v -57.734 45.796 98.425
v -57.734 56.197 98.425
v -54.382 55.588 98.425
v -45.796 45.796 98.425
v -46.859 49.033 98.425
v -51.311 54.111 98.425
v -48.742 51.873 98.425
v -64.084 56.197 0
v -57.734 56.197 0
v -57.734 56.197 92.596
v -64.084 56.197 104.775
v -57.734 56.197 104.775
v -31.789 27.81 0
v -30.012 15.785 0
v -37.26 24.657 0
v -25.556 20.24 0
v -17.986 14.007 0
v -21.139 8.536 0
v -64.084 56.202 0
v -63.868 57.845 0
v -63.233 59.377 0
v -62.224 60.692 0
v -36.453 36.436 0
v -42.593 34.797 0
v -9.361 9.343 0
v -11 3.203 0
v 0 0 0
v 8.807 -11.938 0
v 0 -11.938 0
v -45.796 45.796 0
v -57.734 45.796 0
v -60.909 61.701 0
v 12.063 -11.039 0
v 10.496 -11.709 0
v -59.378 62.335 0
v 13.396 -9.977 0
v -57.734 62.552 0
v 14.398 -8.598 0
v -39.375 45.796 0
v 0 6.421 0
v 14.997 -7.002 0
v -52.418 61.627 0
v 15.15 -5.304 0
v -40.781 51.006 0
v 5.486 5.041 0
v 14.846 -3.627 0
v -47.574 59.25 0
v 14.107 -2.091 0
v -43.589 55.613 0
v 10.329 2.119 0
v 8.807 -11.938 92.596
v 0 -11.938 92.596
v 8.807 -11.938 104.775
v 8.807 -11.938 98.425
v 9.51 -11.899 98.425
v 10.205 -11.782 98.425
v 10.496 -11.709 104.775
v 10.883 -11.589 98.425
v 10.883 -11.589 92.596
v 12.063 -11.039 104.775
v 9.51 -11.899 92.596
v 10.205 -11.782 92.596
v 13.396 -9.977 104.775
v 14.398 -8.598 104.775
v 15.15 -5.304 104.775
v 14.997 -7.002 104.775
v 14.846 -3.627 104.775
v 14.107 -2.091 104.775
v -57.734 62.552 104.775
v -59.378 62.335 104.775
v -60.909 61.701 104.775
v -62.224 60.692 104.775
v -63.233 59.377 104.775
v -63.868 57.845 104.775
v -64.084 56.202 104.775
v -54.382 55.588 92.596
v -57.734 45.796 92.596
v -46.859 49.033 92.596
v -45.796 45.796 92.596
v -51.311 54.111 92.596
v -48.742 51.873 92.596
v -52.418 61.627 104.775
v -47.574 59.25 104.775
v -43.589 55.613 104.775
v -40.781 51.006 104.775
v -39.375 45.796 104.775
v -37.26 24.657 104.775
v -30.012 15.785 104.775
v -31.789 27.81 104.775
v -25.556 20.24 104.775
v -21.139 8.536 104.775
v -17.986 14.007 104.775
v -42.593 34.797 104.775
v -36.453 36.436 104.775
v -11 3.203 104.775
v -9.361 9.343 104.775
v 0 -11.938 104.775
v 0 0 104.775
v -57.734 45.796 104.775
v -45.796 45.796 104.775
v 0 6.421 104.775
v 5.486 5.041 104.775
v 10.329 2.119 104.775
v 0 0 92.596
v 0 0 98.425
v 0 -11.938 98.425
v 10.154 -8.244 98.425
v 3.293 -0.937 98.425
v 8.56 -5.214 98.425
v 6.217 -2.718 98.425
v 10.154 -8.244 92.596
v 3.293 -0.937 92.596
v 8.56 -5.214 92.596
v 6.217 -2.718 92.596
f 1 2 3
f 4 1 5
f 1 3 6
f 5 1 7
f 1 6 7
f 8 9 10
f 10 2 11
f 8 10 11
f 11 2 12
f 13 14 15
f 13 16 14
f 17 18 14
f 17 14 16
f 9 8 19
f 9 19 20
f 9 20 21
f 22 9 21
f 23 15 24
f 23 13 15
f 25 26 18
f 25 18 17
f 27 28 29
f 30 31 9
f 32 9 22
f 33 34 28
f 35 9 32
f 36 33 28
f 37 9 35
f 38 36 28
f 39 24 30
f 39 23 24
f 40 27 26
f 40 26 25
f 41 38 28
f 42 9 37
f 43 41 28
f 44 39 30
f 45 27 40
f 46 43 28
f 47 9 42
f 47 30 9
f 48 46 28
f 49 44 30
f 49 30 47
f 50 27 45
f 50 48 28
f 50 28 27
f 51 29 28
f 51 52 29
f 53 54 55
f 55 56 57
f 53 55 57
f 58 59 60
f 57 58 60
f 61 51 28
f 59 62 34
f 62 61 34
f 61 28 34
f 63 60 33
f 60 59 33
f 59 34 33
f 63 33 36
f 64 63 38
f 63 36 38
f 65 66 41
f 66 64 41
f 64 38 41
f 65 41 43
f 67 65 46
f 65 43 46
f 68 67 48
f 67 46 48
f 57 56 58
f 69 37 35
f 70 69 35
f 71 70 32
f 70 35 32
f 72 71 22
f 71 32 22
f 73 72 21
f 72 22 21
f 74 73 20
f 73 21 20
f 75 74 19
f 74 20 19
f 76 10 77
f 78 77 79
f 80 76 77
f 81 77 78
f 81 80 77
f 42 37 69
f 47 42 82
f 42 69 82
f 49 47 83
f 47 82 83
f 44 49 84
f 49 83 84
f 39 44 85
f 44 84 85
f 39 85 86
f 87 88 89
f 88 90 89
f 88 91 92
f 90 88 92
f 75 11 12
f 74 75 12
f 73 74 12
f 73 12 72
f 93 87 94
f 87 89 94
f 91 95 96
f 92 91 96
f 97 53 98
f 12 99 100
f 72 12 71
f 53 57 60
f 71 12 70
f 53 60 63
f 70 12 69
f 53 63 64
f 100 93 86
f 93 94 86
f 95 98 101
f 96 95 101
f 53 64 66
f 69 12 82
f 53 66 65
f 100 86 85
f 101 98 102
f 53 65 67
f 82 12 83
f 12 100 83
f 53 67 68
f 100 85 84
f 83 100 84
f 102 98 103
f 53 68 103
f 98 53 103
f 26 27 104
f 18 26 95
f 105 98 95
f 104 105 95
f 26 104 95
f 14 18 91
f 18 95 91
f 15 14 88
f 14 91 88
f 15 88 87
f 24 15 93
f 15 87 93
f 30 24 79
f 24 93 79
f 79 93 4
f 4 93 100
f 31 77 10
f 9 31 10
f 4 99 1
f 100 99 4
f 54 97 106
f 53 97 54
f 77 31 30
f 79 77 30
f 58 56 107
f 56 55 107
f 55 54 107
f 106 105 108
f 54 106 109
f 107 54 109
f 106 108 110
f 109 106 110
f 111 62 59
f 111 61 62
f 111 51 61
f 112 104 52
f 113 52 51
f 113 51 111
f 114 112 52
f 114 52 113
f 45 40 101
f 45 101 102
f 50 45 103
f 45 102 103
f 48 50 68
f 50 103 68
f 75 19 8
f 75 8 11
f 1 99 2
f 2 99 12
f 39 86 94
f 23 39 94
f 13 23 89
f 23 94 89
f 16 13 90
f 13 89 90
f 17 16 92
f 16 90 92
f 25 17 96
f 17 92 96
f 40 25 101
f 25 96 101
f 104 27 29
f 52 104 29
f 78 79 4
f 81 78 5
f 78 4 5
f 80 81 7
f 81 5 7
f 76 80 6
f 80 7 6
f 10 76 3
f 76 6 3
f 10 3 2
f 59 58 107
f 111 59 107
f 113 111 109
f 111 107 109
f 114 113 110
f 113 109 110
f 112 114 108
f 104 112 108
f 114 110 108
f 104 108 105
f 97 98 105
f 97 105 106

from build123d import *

# Parameters (mm, degrees)
BOSS_EXTRUDE1_DEPTH = 104.775
BOSS_EXTRUDE2_DEPTH = 92.5957
BOSS_EXTRUDE3_START = -5.8293
BOSS_EXTRUDE3_DEPTH = 5.8293
BOSS_EXTRUDE4_DEPTH = 6.35
SKETCH5_W           = 7.787485422
SKETCH5_H           = 19.833751934
SKETCH5_W_2         = 22.754058967
SKETCH5_H_2         = 3.407024872
CUT_EXTRUDE1_DEPTH  = 227.312030137
SKETCH9_W           = 103.741840618
SKETCH9_H           = 106.576317138
CUT_EXTRUDE4_DEPTH  = 104.775
SKETCH10_W          = 104.775
SKETCH10_H          = 6.354337814
BOSS_EXTRUDE6_DEPTH = 6.35
FILLET2_R           = 6.35


with BuildPart() as part:
    # Sketch1 → Boss-Extrude1 (new, symmetric)
    with BuildSketch(Plane.XY):
        with BuildLine():
            Line((-58.2422, 56.2102), (-58.2422, 62.5602))
            ThreePointArc((-58.2422, 62.5602), (-45.640852469, 57.743322347), (-39.3748699, 45.7962))
            ThreePointArc((-39.3748699, 45.7962), (-25.556268964, 20.239931036), (0, 6.4213301))
            ThreePointArc((0, 6.4213301), (12.247457496, 0.293755183), (17.272, -12.446))
            Line((17.272, -12.446), (10.922, -12.446))
            ThreePointArc((10.922, -12.446), (7.760938146, -4.204686933), (0, 0))
            ThreePointArc((0, 0), (-30.011530905, 15.784669095), (-45.7962, 45.7962))
            ThreePointArc((-45.7962, 45.7962), (-50.144819563, 53.243313205), (-58.2422, 56.2102))
        make_face()
    extrude(amount=BOSS_EXTRUDE1_DEPTH, both=True)


with BuildPart() as boss_extrude2_tool:
    # Sketch2 → Boss-Extrude2 (new, symmetric)
    with BuildSketch(Plane.XY):
        with BuildLine():
            Line((-58.2422, 56.2102), (-58.2422, 45.796198296))
            Line((-58.2422, 45.796198296), (-45.796199685, 45.796198296))
            ThreePointArc((-45.796199685, 45.796198296), (-50.144818899, 53.243312648), (-58.2422, 56.2102))
        make_face()
        with BuildLine():
            Line((0, 0), (0, -12.446))
            Line((0, -12.446), (10.922, -12.446))
            ThreePointArc((10.922, -12.446), (7.760938146, -4.204686933), (0, 0))
        make_face()
    extrude(amount=BOSS_EXTRUDE2_DEPTH, both=True)


with BuildPart() as part_1:
    add(part.part)


with BuildPart() as part_2:
    # Boss-Extrude2: joined with boss_extrude2_tool
    add(part_1.part.fuse(boss_extrude2_tool.part, tol=0.00001))

    # Sketch3 → Boss-Extrude3 (add)
    with BuildSketch(Plane(origin=(0, 0, -104.775), x_dir=(-1, 0, 0), z_dir=(0, 0, -1)).offset(BOSS_EXTRUDE3_START)):
        with BuildLine():
            Line((58.2422, 56.2102), (58.2422, 45.796198296))
            Line((58.2422, 45.796198296), (45.7962, 45.7962))
            ThreePointArc((45.7962, 45.7962), (50.144819563, 53.243313205), (58.2422, 56.2102))
        make_face()
        with BuildLine():
            Line((0, 0), (0, -12.446))
            Line((0, -12.446), (-10.922, -12.446))
            ThreePointArc((-10.922, -12.446), (-7.760938146, -4.204686933), (0, 0))
        make_face()
    extrude(amount=BOSS_EXTRUDE3_DEPTH)

    # Sketch4 → Boss-Extrude4 (add)
    with BuildSketch(Plane.XY.offset(104.775)):
        with BuildLine():
            Line((-58.2422, 56.2102), (-58.2422, 45.796198296))
            Line((-58.2422, 45.796198296), (-45.7962, 45.7962))
            ThreePointArc((-45.7962, 45.7962), (-50.144819563, 53.243313205), (-58.2422, 56.2102))
        make_face()
        with BuildLine():
            Line((0, 0), (0, -12.446))
            Line((0, -12.446), (10.922, -12.446))
            ThreePointArc((10.922, -12.446), (7.760938146, -4.204686933), (0, 0))
        make_face()
    extrude(amount=-BOSS_EXTRUDE4_DEPTH)

    # Sketch5 → Cut-Extrude1 (cut, through all)
    with BuildSketch(Plane.XY.offset(104.775)):
        with Locations((-61.627942711, 54.680509116)):
            Rectangle(SKETCH5_W, SKETCH5_H)
        with Locations((8.225058429, -13.641512436)):
            Rectangle(SKETCH5_W_2, SKETCH5_H_2)
    extrude(amount=-CUT_EXTRUDE1_DEPTH, mode=Mode.SUBTRACT)

    # Sketch9 → Cut-Extrude4 (cut)
    with BuildSketch(Plane(origin=(0, 0, -104.775), x_dir=(-1, 0, 0), z_dir=(0, 0, -1))):
        with Locations((16.552204841, 26.535028587)):
            Rectangle(SKETCH9_W, SKETCH9_H)
    extrude(amount=-CUT_EXTRUDE4_DEPTH, mode=Mode.SUBTRACT)

    # Sketch10 → Boss-Extrude6 (add)
    with BuildSketch(Plane.ZY.offset(57.7342)):
        with Locations((52.3875, 59.374341949)):
            Rectangle(SKETCH10_W, SKETCH10_H)
    extrude(amount=BOSS_EXTRUDE6_DEPTH)

    # Fillet2
    # the kernel refuses this fillet: 6.35 mm, written as the material it takes off along each edge
    with BuildSketch(Plane(origin=(17.260151367, -11.938, -25.849178653), x_dir=(-0.30497213299383213, 0.9523612749882223, 0), z_dir=(0, 0, 1))) as fillet2_piece_1:
        with BuildLine():
            CenterArc((8.625598356, 6.114282737), FILLET2_R, 162.243512631, 123.416753829)
            Line((2.57810426, 8.050855782), (0, 0))
            ThreePointArc((0, 0), (5.169835731, -0.710949564), (10.339671461, 0))
        make_face()
    extrude(amount=156.473357306, mode=Mode.SUBTRACT)
    with BuildSketch(Plane(origin=(-64.0842, 62.551510856, -15.875), x_dir=(1, 0, 0), z_dir=(0, 0, 1))) as fillet2_piece_2:
        with BuildLine():
            CenterArc((FILLET2_R, -FILLET2_R), FILLET2_R, 90, 90)
            Line((0, -FILLET2_R), (0, 0))
            Line((0, 0), (FILLET2_R, 0))
        make_face()
    extrude(amount=136.525, mode=Mode.SUBTRACT)


solid = part_2.part
